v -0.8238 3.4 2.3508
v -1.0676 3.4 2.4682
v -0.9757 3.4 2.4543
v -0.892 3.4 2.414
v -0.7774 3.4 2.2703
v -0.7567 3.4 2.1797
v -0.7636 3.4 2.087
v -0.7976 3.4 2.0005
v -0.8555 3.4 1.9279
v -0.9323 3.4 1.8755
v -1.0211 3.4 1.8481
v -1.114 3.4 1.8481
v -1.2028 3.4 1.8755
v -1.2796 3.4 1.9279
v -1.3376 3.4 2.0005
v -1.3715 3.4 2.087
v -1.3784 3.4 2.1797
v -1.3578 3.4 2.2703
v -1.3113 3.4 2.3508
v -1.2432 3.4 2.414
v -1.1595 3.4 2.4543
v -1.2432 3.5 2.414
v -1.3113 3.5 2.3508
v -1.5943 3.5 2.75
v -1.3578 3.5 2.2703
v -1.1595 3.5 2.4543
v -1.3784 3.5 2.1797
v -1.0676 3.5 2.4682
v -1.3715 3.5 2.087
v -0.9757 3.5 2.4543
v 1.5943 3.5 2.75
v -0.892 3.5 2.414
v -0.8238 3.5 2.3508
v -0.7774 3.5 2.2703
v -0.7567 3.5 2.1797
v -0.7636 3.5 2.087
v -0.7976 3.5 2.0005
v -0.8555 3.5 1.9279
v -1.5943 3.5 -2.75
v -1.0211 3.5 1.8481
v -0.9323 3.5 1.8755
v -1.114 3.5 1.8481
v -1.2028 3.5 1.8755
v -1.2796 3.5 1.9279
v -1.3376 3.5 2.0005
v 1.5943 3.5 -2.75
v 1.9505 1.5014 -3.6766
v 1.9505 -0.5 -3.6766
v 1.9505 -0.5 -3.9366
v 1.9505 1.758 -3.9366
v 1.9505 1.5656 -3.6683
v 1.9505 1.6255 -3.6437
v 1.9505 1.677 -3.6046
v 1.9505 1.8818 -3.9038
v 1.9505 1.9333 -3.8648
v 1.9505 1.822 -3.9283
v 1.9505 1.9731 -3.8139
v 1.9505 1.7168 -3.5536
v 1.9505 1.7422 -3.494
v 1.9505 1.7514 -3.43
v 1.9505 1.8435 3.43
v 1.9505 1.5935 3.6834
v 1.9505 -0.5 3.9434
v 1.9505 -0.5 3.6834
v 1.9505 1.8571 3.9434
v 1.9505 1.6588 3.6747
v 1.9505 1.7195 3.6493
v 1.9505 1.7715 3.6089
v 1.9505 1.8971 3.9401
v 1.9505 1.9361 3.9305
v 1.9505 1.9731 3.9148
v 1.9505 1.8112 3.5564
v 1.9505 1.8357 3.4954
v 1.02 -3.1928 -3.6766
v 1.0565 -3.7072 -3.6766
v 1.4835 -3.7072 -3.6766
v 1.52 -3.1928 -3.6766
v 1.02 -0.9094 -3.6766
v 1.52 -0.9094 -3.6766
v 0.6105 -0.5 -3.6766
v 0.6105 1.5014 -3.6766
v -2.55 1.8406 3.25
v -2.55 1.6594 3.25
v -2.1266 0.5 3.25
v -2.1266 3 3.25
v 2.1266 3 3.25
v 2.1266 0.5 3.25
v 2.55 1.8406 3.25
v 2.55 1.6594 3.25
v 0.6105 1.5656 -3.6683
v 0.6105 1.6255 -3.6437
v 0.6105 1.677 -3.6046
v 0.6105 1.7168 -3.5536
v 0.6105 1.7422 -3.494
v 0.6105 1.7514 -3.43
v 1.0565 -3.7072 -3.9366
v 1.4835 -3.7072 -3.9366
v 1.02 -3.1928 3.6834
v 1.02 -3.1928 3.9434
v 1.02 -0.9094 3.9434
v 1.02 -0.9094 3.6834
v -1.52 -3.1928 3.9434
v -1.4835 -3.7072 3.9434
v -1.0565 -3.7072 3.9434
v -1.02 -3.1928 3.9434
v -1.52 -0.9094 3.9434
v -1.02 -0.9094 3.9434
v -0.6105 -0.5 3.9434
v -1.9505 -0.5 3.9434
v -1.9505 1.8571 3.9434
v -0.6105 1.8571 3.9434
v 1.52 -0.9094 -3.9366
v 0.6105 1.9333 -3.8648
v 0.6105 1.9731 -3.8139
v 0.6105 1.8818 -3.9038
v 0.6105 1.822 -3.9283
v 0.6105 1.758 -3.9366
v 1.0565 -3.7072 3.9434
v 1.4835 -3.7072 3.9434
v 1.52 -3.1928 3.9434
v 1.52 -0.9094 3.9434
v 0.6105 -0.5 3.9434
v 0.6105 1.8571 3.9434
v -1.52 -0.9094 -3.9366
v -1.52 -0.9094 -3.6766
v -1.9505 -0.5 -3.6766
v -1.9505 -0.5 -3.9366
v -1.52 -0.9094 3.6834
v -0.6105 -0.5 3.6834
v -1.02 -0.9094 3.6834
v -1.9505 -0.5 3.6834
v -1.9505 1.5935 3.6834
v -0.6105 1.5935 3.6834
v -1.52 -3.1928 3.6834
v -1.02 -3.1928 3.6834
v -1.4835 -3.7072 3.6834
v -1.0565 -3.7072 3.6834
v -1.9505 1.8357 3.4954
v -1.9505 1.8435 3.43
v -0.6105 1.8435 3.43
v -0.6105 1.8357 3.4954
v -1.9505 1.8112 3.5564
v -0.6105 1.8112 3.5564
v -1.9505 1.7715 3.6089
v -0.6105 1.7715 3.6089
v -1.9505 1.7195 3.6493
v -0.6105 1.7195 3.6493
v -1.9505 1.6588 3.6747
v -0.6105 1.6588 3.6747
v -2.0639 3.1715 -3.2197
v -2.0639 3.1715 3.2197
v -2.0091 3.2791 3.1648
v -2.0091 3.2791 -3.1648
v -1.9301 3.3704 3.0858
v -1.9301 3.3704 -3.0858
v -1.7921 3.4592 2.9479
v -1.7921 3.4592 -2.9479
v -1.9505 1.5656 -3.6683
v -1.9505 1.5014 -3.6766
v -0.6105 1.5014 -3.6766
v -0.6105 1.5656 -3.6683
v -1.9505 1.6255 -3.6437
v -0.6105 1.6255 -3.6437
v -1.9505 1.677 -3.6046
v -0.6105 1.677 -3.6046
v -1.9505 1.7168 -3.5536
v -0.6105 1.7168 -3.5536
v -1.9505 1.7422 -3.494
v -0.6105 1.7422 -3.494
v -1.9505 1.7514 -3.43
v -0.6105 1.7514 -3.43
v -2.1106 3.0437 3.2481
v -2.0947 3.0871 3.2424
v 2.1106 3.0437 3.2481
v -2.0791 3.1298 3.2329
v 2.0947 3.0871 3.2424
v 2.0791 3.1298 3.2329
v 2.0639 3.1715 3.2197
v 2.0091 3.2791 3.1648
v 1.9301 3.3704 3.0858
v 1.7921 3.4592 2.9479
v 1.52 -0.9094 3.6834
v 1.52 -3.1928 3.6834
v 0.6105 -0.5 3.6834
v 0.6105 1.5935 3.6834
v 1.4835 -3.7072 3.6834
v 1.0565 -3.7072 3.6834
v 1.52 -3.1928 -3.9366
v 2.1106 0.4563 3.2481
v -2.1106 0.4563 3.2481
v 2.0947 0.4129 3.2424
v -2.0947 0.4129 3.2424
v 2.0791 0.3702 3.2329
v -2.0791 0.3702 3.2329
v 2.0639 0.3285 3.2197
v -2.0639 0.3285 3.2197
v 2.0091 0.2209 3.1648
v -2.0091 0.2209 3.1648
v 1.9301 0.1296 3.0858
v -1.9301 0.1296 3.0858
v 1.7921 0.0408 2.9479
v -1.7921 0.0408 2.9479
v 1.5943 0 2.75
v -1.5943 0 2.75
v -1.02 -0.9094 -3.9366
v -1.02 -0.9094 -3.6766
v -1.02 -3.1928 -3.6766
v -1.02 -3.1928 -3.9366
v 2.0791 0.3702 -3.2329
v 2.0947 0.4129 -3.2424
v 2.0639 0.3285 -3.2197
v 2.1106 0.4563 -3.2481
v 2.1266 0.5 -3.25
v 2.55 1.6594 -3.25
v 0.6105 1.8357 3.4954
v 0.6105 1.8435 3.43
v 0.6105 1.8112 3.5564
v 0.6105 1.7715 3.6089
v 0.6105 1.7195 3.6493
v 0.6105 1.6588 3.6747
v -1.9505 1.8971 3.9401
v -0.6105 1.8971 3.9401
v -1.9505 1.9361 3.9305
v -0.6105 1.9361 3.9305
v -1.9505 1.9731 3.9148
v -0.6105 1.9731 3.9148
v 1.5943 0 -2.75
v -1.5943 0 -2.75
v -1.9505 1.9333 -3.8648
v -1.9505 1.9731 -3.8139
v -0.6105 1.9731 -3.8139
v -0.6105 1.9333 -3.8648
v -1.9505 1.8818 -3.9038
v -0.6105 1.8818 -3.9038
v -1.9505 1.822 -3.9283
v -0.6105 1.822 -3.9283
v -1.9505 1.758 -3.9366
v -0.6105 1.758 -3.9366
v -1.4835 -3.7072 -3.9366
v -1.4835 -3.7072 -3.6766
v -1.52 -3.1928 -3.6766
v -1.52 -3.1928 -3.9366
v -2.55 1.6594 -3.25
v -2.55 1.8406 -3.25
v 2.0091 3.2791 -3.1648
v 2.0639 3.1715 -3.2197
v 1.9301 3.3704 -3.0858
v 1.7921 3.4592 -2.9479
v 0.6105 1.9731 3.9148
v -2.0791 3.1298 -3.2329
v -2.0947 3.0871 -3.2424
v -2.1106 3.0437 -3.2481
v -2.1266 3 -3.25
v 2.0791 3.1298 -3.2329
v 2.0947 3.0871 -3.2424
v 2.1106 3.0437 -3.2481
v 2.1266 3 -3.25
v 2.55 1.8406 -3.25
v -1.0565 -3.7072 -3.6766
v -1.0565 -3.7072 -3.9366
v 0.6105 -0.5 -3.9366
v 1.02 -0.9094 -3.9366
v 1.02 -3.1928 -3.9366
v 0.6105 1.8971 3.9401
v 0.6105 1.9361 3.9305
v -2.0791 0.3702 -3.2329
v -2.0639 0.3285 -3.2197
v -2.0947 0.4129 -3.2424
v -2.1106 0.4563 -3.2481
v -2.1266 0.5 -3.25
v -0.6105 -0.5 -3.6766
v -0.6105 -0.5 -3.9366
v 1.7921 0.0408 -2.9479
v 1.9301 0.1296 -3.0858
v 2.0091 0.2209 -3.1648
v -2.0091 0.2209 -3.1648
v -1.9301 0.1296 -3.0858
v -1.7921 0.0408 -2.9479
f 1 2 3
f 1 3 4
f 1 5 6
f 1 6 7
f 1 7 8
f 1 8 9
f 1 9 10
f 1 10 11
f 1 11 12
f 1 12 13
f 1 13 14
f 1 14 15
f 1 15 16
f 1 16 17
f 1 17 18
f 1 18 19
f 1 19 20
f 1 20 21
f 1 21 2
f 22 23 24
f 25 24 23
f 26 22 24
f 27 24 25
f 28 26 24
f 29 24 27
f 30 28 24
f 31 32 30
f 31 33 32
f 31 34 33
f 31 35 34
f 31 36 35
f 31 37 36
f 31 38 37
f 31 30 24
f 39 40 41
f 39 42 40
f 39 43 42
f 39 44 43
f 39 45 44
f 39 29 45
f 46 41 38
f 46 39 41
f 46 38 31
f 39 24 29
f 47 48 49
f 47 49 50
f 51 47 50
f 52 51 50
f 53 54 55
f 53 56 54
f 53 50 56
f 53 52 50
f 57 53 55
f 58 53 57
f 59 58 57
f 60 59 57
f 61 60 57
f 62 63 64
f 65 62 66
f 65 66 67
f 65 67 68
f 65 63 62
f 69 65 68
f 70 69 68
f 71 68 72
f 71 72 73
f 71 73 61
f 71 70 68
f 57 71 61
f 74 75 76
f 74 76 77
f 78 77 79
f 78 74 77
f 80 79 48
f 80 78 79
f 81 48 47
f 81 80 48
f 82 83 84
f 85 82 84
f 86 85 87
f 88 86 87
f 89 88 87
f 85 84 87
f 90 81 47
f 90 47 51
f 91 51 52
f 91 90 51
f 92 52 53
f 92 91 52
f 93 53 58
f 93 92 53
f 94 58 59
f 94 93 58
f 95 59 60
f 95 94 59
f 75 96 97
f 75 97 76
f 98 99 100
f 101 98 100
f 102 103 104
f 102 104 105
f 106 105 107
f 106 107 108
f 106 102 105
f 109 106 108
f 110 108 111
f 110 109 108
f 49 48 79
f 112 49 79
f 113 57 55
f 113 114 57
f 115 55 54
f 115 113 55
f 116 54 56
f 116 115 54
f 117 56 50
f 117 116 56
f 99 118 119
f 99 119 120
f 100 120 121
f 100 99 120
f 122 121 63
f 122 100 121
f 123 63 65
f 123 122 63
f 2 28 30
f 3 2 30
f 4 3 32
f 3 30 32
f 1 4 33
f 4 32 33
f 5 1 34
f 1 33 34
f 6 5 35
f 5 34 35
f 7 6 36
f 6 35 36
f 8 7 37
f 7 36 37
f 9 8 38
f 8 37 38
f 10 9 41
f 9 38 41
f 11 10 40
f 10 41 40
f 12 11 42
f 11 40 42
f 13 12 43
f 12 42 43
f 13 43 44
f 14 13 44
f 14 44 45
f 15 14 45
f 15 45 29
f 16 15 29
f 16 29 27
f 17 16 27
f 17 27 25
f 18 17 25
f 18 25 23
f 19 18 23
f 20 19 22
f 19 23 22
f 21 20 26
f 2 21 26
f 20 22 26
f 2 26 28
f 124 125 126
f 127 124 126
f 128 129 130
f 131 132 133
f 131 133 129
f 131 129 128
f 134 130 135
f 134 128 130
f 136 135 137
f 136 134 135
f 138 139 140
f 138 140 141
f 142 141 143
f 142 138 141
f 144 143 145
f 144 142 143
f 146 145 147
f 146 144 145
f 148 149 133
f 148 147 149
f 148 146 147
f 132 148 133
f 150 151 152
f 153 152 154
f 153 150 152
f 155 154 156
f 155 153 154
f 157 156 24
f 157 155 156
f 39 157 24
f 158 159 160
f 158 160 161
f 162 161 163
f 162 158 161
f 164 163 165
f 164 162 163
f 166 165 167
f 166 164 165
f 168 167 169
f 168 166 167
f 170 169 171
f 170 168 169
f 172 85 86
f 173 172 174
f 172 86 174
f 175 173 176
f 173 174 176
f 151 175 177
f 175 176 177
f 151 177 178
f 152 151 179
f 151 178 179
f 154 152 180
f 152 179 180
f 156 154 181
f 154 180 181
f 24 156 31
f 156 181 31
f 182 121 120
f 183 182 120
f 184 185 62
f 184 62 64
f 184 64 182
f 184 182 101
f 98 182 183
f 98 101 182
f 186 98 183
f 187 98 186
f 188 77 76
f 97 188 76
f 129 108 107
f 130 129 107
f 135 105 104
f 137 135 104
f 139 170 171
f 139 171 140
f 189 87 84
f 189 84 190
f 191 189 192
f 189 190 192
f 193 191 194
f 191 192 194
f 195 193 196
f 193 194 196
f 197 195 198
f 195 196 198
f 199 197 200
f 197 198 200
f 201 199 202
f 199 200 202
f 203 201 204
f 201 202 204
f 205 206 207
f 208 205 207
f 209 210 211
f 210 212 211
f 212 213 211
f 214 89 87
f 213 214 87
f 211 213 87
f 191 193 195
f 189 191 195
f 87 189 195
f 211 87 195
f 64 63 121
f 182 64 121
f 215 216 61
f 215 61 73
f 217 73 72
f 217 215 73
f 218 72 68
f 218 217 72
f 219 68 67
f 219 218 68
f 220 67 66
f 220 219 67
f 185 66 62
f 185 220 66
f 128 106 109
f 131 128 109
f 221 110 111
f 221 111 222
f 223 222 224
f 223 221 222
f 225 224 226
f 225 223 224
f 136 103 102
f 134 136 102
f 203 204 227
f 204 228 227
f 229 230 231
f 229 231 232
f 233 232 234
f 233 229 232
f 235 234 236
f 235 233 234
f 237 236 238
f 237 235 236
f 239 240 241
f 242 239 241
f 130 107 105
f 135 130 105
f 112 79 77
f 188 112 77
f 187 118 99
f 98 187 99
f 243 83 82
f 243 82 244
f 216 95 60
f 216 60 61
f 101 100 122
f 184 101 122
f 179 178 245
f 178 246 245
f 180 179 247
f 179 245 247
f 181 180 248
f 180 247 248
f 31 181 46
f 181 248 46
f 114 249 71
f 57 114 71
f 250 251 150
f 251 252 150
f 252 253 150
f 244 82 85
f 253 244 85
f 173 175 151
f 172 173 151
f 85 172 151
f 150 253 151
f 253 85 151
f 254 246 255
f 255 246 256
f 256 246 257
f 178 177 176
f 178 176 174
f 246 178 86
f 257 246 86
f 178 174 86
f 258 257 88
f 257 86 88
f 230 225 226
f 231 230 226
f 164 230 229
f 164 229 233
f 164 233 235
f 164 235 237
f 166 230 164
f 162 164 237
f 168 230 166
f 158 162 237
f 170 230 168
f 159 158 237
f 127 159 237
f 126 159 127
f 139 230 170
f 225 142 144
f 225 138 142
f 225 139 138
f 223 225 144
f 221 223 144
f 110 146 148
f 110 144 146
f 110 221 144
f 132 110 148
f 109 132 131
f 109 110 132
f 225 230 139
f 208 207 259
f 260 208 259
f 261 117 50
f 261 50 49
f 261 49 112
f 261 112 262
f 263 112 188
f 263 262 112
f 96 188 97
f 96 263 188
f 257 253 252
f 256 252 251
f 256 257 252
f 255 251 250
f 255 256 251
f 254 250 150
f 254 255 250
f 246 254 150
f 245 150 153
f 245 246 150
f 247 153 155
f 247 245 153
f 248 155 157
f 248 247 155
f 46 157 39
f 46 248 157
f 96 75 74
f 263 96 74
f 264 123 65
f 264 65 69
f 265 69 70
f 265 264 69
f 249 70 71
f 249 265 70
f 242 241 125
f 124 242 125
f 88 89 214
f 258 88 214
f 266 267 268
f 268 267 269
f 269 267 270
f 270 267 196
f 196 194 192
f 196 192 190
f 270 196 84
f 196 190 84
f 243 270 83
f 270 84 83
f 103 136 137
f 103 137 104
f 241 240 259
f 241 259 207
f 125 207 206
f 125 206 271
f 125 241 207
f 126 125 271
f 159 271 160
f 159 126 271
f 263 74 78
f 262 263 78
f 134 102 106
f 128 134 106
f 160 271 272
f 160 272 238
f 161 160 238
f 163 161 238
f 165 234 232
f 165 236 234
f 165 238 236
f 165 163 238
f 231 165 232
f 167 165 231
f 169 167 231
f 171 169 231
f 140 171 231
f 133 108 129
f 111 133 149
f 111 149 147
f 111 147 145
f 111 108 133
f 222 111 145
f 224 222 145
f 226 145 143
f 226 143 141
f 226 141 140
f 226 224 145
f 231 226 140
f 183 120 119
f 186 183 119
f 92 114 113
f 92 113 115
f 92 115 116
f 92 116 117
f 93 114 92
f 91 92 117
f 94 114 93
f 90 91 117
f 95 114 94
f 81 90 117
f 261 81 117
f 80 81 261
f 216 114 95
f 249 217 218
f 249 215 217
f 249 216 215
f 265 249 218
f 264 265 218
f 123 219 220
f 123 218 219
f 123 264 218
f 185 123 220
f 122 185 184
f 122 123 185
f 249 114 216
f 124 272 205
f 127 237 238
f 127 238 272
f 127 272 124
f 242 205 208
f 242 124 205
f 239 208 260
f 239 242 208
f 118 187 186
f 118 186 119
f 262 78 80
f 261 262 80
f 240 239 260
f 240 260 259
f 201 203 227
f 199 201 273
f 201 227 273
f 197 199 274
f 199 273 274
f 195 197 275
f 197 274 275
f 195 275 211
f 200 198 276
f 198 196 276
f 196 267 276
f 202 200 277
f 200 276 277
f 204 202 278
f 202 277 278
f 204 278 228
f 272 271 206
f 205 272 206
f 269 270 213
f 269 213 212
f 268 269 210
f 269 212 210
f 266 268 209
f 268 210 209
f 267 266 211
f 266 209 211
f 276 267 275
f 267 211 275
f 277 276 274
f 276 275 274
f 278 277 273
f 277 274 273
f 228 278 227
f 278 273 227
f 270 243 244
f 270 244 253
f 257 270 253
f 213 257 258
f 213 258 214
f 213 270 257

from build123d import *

# Parameters (mm, degrees)
SKETCH1_W               = 5.1
SKETCH1_H               = 6.5
BOSS_EXTRUDE1_DEPTH     = 3.5
SKETCH2_R               = 0.311751624
CUT_EXTRUDE1_DEPTH      = 0.1
SKETCH3_OUTSIDE_W       = 8.894
SKETCH3_OUTSIDE_H       = 7.294
CUT_EXTRUDE3_DEPTH      = 8.81040972
FILLET1_R               = 0.5
BOSS_EXTRUDE2_DEPTH     = 5.1
CUT_EXTRUDE7_DEPTH      = 10.0741376
CUT_EXTRUDE7_DEPTH_BACK = 10.0741376
SKETCH5_OUTSIDE_W       = 9.466
SKETCH5_OUTSIDE_H       = 11.573


with BuildPart() as part:
    # Sketch1 → Boss-Extrude1 (new body)
    with BuildSketch(Plane(origin=(0, 0, 0), x_dir=(1, 0, 0), z_dir=(0, 1, 0))):
        Rectangle(SKETCH1_W, SKETCH1_H)
    extrude(amount=BOSS_EXTRUDE1_DEPTH)

    # Sketch2 → Cut-Extrude1 (cut)
    with BuildSketch(Plane(origin=(0, 3.5, 0), x_dir=(1, 0, 0), z_dir=(0, 1, 0))):
        with Locations(Location((-1.067569718, -2.156407837, 0), (0, 0, 270))):
            Circle(SKETCH2_R)
    extrude(amount=-CUT_EXTRUDE1_DEPTH, mode=Mode.SUBTRACT)

    # Sketch3 outside → Cut-Extrude3 (cut, through all)
    with BuildSketch(Plane.XY.offset(3.25)):
        with Locations((0, 1.75)):
            Rectangle(SKETCH3_OUTSIDE_W, SKETCH3_OUTSIDE_H)
        Polygon((-2.55, 1.84057033), (-1.943948555, 3.5), (1.943948555, 3.5), (2.55, 1.84057033), (2.55, 1.65942967), (1.943948555, 0), (-1.943948555, 0), (-2.55, 1.65942967), align=None, mode=Mode.SUBTRACT)
    extrude(amount=-CUT_EXTRUDE3_DEPTH, mode=Mode.SUBTRACT)

    # Fillet1
    fillet1_edges = [part.edges().sort_by_distance(p)[0] for p in [
        (0, 0, 3.25),
        (0, 0, -3.25),
        (0, 3.5, -3.25),
        (0, 3.5, 3.25),
        (1.943948555, 3.5, 0),
        (-1.943948555, 3.5, 0),
        (1.943948555, 0, 0),
        (-1.943948555, 0, 0),
    ]]
    fillet(fillet1_edges, radius=FILLET1_R)


with BuildPart() as body_2:
    # Sketch4 → Boss-Extrude2 (new, through all)
    with BuildSketch(Plane.ZY.offset(2.55)):
        with BuildLine():
            Line((-3.936643854, -3.707164749), (-3.676643854, -3.707164749))
            Line((-3.676643854, -3.707164749), (-3.676643854, 1.501435709))
            ThreePointArc((-3.676643854, 1.501435709), (-3.6046032, 1.677021788), (-3.430000086, 1.751413179))
            Line((-3.430000086, 1.751413179), (3.430000086, 1.843516476))
            ThreePointArc((3.430000086, 1.843516476), (3.608942396, 1.771498352), (3.683356317, 1.593539006))
            Line((3.683356317, 1.593539006), (3.683356317, -3.707164749))
            Line((3.683356317, -3.707164749), (3.943356317, -3.707164749))
            Line((3.943356317, -3.707164749), (3.943356317, 1.857053234))
            ThreePointArc((3.943356317, 1.857053234), (3.868942396, 2.035012581), (3.690000086, 2.107030705))
            Line((3.690000086, 2.107030705), (-3.690000086, 2.007945817))
            ThreePointArc((-3.690000086, 2.007945817), (-3.8646032, 1.933554425), (-3.936643854, 1.757968346))
            Line((-3.936643854, 1.757968346), (-3.936643854, -3.707164749))
        make_face()
    extrude(amount=-BOSS_EXTRUDE2_DEPTH)

    # Sketch5 outside → Cut-Extrude7 (cut, two sides: drawn at the far end of the back side and taken through both)
    with BuildSketch(Plane(origin=(0, 0, -3.936643854), x_dir=(-1, 0, 0), z_dir=(0, 0, -1)).offset(-CUT_EXTRUDE7_DEPTH_BACK)):
        with Locations((0, -0.1035)):
            Rectangle(SKETCH5_OUTSIDE_W, SKETCH5_OUTSIDE_H)
        Polygon((-1.02, -3.19277423), (-1.02, -0.90942967), (-0.610520763, -0.5), (-0.610520763, 1.757968346), (-0.610520763, 1.973134899), (-1.950520763, 1.973134899), (-1.950520763, 1.757968346), (-1.950520763, -0.5), (-1.52, -0.90942967), (-1.52, -3.19277423), (-1.483452684, -3.707164749), (-1.056547316, -3.707164749), align=None, mode=Mode.SUBTRACT)
        Polygon((1.52, -0.90942967), (1.950520763, -0.5), (1.950520763, 1.757968346), (1.950520763, 1.973134899), (0.610520763, 1.973134899), (0.610520763, 1.757968346), (0.610520763, -0.5), (1.02, -0.90942967), (1.02, -3.19277423), (1.056547316, -3.707164749), (1.483452684, -3.707164749), (1.52, -3.19277423), align=None, mode=Mode.SUBTRACT)
    extrude(amount=CUT_EXTRUDE7_DEPTH + CUT_EXTRUDE7_DEPTH_BACK, mode=Mode.SUBTRACT)


with BuildPart() as cut_extrude7_piece_1:
    # of the separate pieces the step leaves, piece 1, a body of its own (cut_extrude7_pieces)
    add(body_2.part.solids().sort_by_distance((1.950520763, 1.973134899, -3.813936252))[0])


with BuildPart() as cut_extrude7_piece_2:
    # of the separate pieces the step leaves, piece 2, a body of its own (cut_extrude7_pieces)
    add(body_2.part.solids().sort_by_distance((-1.950520763, 1.757968346, -3.936643854))[0])


solid = Compound([part.part, cut_extrude7_piece_1.part, cut_extrude7_piece_2.part])
